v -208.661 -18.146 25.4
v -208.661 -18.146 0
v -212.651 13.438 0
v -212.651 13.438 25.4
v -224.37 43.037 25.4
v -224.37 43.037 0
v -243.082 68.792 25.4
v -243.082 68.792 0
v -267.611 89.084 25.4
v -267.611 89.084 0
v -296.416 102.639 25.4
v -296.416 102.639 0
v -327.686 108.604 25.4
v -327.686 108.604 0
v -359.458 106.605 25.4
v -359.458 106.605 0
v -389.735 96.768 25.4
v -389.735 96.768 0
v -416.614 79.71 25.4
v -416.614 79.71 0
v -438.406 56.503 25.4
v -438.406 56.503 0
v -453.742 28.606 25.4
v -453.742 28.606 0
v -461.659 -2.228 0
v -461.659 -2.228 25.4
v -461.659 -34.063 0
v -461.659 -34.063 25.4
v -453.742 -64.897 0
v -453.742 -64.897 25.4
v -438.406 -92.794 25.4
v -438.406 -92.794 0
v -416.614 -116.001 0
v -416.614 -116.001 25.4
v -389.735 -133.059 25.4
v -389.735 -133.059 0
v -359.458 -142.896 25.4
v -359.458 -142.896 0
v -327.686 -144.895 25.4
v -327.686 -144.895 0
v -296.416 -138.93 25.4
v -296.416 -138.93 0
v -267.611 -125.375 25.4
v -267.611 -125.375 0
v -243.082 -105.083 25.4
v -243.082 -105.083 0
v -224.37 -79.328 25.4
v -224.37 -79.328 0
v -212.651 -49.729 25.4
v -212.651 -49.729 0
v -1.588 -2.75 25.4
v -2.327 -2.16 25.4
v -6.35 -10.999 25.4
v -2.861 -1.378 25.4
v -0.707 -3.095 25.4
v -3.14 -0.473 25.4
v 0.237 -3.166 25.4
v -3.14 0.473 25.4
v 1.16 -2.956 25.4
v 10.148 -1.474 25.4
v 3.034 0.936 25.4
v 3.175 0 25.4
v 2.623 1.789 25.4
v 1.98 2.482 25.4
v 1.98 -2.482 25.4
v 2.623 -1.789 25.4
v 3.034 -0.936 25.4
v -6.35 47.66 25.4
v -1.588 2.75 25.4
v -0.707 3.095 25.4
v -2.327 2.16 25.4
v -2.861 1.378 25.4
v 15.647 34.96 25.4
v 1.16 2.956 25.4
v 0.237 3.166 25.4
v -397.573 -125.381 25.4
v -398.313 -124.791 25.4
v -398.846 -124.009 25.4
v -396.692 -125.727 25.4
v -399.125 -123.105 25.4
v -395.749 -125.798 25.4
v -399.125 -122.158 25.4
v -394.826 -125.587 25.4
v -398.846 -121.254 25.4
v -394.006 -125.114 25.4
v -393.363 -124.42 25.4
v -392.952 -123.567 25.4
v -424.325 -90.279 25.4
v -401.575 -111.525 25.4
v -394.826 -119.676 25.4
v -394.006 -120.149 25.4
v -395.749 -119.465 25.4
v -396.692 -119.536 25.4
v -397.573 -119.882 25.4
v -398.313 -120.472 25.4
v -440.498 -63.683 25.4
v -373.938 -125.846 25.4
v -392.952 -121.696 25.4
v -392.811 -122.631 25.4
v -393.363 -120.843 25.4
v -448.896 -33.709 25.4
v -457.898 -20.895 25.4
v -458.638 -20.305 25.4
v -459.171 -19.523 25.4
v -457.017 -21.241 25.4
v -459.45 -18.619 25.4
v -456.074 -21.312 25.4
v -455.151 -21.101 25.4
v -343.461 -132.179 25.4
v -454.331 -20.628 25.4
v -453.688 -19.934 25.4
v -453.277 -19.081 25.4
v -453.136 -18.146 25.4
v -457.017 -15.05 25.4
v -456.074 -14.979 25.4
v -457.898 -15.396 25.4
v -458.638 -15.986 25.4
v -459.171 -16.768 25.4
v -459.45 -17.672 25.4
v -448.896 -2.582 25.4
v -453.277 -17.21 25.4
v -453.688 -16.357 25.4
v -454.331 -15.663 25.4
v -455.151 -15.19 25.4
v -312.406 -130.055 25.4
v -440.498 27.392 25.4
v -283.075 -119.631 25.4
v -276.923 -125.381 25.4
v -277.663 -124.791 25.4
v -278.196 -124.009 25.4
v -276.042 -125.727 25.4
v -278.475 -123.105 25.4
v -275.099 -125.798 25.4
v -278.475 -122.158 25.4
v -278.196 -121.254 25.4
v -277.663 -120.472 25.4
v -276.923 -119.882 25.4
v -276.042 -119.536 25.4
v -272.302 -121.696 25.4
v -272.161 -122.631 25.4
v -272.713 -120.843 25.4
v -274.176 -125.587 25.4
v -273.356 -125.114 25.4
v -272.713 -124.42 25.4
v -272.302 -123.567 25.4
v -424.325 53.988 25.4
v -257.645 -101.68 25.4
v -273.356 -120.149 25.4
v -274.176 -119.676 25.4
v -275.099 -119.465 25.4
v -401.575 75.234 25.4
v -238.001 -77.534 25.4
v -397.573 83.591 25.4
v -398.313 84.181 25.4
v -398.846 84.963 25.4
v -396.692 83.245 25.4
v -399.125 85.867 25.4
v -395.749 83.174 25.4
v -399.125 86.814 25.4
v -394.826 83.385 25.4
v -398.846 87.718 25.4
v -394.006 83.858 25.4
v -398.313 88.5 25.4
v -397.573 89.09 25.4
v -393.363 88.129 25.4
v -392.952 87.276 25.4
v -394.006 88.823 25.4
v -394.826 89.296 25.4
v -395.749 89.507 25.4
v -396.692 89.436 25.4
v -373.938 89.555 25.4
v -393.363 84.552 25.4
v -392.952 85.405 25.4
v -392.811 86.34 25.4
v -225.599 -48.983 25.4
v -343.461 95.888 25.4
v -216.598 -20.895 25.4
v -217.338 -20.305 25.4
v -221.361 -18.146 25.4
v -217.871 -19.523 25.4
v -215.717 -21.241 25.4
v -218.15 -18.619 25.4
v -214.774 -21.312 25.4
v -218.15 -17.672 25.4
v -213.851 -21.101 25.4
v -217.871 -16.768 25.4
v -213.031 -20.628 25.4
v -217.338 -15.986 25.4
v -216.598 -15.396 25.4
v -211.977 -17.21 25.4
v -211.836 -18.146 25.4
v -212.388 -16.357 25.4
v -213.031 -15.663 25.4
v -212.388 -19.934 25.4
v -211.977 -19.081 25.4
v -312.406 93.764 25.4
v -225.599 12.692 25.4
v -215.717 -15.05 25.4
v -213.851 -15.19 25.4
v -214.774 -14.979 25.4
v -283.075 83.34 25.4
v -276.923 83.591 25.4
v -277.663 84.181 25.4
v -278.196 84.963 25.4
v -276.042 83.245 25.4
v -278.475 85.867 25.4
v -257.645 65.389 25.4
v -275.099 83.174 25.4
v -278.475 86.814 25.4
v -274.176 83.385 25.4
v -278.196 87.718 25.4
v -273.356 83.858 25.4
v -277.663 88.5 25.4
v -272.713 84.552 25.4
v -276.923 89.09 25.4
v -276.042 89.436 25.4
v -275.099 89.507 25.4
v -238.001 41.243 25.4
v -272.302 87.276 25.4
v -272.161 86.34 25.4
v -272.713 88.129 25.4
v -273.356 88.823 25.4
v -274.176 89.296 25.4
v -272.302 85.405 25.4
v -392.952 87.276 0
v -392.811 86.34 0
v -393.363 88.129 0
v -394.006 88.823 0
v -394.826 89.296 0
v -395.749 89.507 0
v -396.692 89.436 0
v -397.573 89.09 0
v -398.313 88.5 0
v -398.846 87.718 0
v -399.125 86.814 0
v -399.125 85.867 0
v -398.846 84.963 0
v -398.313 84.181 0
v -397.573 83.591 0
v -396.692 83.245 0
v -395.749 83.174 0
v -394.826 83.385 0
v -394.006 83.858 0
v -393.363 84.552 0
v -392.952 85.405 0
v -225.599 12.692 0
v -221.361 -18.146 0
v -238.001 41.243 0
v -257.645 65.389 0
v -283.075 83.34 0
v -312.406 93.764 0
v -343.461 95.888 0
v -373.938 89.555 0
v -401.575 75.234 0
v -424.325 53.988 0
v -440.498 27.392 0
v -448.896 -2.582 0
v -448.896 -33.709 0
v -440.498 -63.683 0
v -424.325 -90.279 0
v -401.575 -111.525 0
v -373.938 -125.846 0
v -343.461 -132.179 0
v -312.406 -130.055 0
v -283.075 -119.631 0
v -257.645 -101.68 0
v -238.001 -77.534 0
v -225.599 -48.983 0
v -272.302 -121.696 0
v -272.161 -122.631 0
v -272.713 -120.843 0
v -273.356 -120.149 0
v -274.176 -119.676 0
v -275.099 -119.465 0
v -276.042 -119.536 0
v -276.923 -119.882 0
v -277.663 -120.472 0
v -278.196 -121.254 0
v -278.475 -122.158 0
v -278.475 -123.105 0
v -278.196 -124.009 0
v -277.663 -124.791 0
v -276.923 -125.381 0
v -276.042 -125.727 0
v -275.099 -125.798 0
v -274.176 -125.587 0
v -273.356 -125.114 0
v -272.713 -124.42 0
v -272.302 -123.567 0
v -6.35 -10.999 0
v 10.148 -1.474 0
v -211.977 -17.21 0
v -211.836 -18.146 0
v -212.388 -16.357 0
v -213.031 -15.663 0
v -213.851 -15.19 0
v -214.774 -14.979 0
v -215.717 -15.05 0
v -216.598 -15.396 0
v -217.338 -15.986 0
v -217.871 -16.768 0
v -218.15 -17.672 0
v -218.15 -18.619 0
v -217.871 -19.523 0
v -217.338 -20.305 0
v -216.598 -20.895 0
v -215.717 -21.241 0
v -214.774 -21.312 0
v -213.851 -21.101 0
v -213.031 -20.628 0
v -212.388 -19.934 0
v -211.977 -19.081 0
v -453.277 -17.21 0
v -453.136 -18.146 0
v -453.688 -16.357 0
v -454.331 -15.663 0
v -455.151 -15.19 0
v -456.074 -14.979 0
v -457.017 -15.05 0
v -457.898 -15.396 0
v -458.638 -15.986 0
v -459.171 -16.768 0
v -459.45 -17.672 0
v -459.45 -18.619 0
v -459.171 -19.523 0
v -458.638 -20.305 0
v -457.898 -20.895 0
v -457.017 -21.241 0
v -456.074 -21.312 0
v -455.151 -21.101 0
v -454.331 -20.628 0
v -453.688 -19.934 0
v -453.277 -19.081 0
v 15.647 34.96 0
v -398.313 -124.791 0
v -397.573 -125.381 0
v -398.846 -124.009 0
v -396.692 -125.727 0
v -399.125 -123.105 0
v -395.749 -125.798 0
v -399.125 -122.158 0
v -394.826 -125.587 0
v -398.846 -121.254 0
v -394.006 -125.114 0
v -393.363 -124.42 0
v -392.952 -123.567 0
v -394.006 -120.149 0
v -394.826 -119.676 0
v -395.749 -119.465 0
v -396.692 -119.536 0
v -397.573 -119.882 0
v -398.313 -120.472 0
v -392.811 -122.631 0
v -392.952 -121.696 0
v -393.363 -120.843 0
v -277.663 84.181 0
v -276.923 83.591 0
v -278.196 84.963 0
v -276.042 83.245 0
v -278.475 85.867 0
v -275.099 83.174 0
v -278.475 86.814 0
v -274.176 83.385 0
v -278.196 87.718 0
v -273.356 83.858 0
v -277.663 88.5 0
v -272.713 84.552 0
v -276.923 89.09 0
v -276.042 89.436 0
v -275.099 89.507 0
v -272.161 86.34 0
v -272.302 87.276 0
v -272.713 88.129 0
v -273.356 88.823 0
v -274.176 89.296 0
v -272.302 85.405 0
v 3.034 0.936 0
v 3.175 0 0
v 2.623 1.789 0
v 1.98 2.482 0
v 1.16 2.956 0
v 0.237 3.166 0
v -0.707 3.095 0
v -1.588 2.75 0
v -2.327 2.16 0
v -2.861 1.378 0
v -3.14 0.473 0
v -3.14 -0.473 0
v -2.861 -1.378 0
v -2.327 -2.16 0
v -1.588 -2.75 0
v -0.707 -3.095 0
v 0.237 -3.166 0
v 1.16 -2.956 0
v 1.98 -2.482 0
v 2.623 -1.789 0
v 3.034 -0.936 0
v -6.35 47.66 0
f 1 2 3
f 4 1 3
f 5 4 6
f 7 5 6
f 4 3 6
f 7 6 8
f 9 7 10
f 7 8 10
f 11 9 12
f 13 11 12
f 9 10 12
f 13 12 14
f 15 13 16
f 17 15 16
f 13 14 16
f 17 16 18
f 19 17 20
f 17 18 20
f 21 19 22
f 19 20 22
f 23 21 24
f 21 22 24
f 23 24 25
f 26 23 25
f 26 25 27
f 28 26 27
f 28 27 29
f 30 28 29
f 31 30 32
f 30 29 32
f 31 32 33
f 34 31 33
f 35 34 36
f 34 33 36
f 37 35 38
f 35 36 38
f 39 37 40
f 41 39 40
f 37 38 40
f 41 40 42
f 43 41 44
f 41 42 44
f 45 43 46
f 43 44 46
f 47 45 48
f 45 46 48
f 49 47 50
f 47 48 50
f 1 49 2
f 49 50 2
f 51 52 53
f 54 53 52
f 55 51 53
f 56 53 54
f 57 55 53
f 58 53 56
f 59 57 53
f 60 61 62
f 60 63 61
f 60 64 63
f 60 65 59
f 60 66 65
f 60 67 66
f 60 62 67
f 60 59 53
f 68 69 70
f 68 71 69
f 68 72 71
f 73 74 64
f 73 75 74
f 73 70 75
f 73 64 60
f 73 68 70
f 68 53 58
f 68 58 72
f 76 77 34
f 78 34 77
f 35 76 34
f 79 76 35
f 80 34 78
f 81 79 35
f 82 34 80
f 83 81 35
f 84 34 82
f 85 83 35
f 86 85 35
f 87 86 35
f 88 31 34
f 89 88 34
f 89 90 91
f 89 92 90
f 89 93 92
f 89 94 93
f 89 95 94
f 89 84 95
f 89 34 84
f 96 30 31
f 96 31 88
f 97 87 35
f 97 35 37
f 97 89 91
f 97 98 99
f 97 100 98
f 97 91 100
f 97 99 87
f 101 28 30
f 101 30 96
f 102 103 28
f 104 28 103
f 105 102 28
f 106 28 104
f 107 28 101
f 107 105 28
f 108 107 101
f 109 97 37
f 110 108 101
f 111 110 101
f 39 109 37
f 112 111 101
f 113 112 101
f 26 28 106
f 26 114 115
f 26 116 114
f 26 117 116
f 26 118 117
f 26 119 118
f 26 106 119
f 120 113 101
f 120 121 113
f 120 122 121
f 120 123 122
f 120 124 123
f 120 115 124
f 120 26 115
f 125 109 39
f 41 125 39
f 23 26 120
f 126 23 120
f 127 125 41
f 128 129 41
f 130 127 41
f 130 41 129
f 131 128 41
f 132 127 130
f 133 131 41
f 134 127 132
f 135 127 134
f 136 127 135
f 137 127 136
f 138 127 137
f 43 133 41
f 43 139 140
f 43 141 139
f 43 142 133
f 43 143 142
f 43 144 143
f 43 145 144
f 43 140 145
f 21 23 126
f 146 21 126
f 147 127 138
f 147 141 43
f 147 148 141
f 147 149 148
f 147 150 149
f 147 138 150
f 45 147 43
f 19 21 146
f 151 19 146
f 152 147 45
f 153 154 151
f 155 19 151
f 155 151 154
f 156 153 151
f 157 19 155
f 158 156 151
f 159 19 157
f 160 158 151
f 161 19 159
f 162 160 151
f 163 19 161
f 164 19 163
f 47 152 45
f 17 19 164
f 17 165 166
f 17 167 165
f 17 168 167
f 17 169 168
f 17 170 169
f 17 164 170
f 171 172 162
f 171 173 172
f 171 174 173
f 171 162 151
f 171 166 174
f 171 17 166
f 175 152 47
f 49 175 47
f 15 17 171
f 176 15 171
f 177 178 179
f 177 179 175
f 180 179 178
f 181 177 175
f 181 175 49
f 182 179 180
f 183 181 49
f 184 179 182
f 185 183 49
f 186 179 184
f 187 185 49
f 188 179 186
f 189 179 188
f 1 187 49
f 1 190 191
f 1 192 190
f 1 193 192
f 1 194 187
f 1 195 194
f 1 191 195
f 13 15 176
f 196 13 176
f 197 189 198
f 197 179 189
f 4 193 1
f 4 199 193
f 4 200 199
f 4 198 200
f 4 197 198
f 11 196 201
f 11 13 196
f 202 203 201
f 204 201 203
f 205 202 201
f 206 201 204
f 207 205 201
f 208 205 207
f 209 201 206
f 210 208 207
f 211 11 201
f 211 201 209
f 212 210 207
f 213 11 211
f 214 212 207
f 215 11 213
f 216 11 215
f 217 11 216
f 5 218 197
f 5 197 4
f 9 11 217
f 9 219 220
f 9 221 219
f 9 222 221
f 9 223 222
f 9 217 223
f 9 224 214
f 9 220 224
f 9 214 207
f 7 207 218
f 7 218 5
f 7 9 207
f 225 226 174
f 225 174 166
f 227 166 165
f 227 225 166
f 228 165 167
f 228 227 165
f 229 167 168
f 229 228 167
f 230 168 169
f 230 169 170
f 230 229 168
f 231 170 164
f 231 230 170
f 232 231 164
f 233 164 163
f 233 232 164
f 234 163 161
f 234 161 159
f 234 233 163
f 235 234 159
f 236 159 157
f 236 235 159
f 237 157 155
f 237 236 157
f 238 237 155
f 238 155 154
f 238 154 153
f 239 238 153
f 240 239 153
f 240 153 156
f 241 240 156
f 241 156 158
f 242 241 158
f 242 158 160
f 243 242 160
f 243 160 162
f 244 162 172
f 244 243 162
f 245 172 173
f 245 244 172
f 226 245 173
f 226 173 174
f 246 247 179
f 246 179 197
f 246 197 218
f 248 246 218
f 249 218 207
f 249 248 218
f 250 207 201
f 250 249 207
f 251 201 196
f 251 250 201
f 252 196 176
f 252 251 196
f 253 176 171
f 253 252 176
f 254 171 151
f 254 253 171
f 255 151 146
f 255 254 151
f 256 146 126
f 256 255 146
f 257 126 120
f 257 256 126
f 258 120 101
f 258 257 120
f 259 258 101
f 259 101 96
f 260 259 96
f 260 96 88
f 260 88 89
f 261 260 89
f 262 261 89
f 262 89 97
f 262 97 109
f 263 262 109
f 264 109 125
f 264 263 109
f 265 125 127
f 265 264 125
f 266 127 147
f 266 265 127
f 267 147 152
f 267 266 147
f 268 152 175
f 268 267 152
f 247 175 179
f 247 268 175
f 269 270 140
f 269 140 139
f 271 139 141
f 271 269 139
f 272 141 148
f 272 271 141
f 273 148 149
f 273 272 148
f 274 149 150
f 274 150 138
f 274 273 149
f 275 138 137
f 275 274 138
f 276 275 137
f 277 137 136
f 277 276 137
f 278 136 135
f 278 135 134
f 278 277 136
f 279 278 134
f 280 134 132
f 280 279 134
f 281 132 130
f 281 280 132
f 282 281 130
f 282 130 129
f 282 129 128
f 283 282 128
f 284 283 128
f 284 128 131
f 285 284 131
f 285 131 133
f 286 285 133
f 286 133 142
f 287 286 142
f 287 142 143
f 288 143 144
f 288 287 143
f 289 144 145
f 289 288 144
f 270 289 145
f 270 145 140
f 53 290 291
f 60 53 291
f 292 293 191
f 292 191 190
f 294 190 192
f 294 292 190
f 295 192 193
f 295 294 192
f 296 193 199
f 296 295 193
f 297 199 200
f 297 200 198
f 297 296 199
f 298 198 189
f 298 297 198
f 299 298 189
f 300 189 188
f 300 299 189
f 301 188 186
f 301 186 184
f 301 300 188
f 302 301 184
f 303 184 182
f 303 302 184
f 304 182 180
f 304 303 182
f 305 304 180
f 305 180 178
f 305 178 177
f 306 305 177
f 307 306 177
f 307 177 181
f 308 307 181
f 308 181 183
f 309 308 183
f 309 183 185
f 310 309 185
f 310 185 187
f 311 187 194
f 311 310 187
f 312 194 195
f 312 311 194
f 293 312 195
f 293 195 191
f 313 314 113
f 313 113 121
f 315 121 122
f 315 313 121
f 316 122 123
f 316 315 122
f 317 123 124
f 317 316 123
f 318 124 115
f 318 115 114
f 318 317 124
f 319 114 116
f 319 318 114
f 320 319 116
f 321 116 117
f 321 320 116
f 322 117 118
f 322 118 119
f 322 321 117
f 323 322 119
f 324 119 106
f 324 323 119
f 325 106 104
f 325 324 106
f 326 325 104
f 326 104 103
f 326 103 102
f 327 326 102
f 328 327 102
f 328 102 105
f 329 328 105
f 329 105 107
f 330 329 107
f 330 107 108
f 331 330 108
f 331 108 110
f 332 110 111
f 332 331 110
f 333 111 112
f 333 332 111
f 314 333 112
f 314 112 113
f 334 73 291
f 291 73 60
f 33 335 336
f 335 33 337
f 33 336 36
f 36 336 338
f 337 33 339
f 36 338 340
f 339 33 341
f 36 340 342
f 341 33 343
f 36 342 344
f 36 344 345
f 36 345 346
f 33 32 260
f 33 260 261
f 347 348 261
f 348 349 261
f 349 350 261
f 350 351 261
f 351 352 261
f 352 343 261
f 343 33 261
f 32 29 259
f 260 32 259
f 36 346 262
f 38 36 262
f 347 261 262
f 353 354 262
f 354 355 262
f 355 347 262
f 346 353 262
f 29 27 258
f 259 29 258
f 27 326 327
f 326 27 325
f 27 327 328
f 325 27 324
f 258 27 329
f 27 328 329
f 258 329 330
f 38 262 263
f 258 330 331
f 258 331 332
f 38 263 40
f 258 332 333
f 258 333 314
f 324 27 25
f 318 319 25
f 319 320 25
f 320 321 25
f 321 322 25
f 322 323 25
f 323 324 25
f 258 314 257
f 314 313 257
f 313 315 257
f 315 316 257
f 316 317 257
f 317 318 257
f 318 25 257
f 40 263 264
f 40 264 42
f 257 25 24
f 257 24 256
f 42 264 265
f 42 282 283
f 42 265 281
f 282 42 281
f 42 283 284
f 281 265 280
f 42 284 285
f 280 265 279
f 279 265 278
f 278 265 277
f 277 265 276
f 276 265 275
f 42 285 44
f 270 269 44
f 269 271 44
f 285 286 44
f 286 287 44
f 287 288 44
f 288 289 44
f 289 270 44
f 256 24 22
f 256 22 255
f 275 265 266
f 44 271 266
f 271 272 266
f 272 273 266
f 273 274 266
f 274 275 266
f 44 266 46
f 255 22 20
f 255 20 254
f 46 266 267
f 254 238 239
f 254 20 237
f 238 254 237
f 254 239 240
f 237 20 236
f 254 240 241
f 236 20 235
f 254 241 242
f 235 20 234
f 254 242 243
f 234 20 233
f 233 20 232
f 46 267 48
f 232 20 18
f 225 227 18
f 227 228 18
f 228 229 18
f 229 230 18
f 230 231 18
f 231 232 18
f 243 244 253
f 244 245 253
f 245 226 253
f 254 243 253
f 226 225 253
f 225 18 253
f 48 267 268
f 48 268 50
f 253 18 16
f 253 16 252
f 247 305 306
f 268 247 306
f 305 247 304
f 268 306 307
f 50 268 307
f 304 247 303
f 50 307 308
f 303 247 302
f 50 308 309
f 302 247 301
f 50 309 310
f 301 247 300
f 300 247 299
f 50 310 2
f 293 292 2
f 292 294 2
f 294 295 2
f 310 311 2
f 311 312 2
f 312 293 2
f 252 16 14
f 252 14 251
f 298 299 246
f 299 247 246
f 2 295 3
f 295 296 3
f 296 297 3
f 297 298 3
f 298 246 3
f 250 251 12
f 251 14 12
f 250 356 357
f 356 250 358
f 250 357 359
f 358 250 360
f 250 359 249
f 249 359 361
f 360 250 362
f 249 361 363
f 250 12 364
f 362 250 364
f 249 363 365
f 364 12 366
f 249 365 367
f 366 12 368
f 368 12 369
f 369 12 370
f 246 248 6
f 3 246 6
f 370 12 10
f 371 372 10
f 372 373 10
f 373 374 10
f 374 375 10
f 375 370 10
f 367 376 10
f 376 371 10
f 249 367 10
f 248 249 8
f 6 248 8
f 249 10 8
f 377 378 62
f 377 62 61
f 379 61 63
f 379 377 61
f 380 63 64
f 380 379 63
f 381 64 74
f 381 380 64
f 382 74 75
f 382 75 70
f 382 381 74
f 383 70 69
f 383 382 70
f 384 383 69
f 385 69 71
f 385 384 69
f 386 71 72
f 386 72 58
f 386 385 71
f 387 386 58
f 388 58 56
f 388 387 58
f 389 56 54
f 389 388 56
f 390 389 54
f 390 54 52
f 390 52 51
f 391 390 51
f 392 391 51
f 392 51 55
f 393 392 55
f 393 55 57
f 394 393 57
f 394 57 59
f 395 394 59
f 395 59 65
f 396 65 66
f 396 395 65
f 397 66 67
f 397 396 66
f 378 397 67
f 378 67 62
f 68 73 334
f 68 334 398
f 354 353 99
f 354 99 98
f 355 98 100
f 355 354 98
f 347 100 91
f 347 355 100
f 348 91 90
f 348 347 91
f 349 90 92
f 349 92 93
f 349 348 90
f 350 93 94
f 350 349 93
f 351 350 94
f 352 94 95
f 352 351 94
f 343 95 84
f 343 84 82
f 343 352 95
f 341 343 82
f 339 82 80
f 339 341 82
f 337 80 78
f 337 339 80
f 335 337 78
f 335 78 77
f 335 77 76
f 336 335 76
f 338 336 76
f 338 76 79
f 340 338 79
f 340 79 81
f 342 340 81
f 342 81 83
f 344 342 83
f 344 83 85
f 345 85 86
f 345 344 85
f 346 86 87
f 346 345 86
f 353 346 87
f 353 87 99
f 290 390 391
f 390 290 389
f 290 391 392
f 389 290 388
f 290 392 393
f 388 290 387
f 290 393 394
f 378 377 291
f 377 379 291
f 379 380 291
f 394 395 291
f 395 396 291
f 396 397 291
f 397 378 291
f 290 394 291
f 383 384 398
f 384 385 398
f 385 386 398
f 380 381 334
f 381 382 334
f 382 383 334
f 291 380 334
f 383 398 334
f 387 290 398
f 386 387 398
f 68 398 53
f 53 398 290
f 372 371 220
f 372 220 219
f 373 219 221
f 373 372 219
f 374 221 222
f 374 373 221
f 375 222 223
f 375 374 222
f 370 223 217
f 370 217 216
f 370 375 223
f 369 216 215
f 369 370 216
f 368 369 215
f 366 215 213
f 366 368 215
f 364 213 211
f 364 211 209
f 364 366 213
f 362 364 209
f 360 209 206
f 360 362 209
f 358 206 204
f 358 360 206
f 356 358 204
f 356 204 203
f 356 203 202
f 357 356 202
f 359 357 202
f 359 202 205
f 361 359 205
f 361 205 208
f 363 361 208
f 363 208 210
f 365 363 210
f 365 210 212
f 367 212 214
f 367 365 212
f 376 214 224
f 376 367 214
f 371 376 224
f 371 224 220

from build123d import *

# Parameters (mm, degrees)
F0_R     = 3.175
F1_DEPTH = 25.4
F3_DEPTH = 25.401
F4_R     = 127
F4_R_2   = 3.175
F4_R_3   = 114.3
F5_DEPTH = 25.4


with BuildPart() as f1:
    # F0 (on Top) → F1 (new body)
    with BuildSketch(Plane.XY):
        Polygon((-6.35, -10.998523), (44.45, 18.330871), (-6.35, 47.660265), align=None)
        Circle(F0_R, mode=Mode.SUBTRACT)
    extrude(amount=F1_DEPTH)

    # F2 (on face) → F3 (cut, through all)
    with BuildSketch(Plane.XY.offset(25.4)):
        Polygon((15.647045, 34.960265), (10.147784, -1.473523), (44.45, 18.330871), align=None)
    extrude(amount=-F3_DEPTH, mode=Mode.SUBTRACT)


with BuildPart() as f5:
    # F4 (on Top) → F5 (new body)
    with BuildSketch(Plane.XY):
        with Locations((-335.660875, -18.14553)):
            Circle(F4_R)
        with Locations((-395.985875, -122.631495)):
            Circle(F4_R_2, mode=Mode.SUBTRACT)
        with Locations((-275.335875, -122.631495)):
            Circle(F4_R_2, mode=Mode.SUBTRACT)
        with Locations((-456.310875, -18.14553)):
            Circle(F4_R_2, mode=Mode.SUBTRACT)
        with Locations((-395.985875, 86.340435)):
            Circle(F4_R_2, mode=Mode.SUBTRACT)
        with Locations((-335.660875, -18.14553)):
            Circle(F4_R_3, mode=Mode.SUBTRACT)
        with Locations((-215.010875, -18.14553)):
            Circle(F4_R_2, mode=Mode.SUBTRACT)
        with Locations((-275.335875, 86.340435)):
            Circle(F4_R_2, mode=Mode.SUBTRACT)
    extrude(amount=F5_DEPTH)


solid = Compound([f1.part, f5.part])
